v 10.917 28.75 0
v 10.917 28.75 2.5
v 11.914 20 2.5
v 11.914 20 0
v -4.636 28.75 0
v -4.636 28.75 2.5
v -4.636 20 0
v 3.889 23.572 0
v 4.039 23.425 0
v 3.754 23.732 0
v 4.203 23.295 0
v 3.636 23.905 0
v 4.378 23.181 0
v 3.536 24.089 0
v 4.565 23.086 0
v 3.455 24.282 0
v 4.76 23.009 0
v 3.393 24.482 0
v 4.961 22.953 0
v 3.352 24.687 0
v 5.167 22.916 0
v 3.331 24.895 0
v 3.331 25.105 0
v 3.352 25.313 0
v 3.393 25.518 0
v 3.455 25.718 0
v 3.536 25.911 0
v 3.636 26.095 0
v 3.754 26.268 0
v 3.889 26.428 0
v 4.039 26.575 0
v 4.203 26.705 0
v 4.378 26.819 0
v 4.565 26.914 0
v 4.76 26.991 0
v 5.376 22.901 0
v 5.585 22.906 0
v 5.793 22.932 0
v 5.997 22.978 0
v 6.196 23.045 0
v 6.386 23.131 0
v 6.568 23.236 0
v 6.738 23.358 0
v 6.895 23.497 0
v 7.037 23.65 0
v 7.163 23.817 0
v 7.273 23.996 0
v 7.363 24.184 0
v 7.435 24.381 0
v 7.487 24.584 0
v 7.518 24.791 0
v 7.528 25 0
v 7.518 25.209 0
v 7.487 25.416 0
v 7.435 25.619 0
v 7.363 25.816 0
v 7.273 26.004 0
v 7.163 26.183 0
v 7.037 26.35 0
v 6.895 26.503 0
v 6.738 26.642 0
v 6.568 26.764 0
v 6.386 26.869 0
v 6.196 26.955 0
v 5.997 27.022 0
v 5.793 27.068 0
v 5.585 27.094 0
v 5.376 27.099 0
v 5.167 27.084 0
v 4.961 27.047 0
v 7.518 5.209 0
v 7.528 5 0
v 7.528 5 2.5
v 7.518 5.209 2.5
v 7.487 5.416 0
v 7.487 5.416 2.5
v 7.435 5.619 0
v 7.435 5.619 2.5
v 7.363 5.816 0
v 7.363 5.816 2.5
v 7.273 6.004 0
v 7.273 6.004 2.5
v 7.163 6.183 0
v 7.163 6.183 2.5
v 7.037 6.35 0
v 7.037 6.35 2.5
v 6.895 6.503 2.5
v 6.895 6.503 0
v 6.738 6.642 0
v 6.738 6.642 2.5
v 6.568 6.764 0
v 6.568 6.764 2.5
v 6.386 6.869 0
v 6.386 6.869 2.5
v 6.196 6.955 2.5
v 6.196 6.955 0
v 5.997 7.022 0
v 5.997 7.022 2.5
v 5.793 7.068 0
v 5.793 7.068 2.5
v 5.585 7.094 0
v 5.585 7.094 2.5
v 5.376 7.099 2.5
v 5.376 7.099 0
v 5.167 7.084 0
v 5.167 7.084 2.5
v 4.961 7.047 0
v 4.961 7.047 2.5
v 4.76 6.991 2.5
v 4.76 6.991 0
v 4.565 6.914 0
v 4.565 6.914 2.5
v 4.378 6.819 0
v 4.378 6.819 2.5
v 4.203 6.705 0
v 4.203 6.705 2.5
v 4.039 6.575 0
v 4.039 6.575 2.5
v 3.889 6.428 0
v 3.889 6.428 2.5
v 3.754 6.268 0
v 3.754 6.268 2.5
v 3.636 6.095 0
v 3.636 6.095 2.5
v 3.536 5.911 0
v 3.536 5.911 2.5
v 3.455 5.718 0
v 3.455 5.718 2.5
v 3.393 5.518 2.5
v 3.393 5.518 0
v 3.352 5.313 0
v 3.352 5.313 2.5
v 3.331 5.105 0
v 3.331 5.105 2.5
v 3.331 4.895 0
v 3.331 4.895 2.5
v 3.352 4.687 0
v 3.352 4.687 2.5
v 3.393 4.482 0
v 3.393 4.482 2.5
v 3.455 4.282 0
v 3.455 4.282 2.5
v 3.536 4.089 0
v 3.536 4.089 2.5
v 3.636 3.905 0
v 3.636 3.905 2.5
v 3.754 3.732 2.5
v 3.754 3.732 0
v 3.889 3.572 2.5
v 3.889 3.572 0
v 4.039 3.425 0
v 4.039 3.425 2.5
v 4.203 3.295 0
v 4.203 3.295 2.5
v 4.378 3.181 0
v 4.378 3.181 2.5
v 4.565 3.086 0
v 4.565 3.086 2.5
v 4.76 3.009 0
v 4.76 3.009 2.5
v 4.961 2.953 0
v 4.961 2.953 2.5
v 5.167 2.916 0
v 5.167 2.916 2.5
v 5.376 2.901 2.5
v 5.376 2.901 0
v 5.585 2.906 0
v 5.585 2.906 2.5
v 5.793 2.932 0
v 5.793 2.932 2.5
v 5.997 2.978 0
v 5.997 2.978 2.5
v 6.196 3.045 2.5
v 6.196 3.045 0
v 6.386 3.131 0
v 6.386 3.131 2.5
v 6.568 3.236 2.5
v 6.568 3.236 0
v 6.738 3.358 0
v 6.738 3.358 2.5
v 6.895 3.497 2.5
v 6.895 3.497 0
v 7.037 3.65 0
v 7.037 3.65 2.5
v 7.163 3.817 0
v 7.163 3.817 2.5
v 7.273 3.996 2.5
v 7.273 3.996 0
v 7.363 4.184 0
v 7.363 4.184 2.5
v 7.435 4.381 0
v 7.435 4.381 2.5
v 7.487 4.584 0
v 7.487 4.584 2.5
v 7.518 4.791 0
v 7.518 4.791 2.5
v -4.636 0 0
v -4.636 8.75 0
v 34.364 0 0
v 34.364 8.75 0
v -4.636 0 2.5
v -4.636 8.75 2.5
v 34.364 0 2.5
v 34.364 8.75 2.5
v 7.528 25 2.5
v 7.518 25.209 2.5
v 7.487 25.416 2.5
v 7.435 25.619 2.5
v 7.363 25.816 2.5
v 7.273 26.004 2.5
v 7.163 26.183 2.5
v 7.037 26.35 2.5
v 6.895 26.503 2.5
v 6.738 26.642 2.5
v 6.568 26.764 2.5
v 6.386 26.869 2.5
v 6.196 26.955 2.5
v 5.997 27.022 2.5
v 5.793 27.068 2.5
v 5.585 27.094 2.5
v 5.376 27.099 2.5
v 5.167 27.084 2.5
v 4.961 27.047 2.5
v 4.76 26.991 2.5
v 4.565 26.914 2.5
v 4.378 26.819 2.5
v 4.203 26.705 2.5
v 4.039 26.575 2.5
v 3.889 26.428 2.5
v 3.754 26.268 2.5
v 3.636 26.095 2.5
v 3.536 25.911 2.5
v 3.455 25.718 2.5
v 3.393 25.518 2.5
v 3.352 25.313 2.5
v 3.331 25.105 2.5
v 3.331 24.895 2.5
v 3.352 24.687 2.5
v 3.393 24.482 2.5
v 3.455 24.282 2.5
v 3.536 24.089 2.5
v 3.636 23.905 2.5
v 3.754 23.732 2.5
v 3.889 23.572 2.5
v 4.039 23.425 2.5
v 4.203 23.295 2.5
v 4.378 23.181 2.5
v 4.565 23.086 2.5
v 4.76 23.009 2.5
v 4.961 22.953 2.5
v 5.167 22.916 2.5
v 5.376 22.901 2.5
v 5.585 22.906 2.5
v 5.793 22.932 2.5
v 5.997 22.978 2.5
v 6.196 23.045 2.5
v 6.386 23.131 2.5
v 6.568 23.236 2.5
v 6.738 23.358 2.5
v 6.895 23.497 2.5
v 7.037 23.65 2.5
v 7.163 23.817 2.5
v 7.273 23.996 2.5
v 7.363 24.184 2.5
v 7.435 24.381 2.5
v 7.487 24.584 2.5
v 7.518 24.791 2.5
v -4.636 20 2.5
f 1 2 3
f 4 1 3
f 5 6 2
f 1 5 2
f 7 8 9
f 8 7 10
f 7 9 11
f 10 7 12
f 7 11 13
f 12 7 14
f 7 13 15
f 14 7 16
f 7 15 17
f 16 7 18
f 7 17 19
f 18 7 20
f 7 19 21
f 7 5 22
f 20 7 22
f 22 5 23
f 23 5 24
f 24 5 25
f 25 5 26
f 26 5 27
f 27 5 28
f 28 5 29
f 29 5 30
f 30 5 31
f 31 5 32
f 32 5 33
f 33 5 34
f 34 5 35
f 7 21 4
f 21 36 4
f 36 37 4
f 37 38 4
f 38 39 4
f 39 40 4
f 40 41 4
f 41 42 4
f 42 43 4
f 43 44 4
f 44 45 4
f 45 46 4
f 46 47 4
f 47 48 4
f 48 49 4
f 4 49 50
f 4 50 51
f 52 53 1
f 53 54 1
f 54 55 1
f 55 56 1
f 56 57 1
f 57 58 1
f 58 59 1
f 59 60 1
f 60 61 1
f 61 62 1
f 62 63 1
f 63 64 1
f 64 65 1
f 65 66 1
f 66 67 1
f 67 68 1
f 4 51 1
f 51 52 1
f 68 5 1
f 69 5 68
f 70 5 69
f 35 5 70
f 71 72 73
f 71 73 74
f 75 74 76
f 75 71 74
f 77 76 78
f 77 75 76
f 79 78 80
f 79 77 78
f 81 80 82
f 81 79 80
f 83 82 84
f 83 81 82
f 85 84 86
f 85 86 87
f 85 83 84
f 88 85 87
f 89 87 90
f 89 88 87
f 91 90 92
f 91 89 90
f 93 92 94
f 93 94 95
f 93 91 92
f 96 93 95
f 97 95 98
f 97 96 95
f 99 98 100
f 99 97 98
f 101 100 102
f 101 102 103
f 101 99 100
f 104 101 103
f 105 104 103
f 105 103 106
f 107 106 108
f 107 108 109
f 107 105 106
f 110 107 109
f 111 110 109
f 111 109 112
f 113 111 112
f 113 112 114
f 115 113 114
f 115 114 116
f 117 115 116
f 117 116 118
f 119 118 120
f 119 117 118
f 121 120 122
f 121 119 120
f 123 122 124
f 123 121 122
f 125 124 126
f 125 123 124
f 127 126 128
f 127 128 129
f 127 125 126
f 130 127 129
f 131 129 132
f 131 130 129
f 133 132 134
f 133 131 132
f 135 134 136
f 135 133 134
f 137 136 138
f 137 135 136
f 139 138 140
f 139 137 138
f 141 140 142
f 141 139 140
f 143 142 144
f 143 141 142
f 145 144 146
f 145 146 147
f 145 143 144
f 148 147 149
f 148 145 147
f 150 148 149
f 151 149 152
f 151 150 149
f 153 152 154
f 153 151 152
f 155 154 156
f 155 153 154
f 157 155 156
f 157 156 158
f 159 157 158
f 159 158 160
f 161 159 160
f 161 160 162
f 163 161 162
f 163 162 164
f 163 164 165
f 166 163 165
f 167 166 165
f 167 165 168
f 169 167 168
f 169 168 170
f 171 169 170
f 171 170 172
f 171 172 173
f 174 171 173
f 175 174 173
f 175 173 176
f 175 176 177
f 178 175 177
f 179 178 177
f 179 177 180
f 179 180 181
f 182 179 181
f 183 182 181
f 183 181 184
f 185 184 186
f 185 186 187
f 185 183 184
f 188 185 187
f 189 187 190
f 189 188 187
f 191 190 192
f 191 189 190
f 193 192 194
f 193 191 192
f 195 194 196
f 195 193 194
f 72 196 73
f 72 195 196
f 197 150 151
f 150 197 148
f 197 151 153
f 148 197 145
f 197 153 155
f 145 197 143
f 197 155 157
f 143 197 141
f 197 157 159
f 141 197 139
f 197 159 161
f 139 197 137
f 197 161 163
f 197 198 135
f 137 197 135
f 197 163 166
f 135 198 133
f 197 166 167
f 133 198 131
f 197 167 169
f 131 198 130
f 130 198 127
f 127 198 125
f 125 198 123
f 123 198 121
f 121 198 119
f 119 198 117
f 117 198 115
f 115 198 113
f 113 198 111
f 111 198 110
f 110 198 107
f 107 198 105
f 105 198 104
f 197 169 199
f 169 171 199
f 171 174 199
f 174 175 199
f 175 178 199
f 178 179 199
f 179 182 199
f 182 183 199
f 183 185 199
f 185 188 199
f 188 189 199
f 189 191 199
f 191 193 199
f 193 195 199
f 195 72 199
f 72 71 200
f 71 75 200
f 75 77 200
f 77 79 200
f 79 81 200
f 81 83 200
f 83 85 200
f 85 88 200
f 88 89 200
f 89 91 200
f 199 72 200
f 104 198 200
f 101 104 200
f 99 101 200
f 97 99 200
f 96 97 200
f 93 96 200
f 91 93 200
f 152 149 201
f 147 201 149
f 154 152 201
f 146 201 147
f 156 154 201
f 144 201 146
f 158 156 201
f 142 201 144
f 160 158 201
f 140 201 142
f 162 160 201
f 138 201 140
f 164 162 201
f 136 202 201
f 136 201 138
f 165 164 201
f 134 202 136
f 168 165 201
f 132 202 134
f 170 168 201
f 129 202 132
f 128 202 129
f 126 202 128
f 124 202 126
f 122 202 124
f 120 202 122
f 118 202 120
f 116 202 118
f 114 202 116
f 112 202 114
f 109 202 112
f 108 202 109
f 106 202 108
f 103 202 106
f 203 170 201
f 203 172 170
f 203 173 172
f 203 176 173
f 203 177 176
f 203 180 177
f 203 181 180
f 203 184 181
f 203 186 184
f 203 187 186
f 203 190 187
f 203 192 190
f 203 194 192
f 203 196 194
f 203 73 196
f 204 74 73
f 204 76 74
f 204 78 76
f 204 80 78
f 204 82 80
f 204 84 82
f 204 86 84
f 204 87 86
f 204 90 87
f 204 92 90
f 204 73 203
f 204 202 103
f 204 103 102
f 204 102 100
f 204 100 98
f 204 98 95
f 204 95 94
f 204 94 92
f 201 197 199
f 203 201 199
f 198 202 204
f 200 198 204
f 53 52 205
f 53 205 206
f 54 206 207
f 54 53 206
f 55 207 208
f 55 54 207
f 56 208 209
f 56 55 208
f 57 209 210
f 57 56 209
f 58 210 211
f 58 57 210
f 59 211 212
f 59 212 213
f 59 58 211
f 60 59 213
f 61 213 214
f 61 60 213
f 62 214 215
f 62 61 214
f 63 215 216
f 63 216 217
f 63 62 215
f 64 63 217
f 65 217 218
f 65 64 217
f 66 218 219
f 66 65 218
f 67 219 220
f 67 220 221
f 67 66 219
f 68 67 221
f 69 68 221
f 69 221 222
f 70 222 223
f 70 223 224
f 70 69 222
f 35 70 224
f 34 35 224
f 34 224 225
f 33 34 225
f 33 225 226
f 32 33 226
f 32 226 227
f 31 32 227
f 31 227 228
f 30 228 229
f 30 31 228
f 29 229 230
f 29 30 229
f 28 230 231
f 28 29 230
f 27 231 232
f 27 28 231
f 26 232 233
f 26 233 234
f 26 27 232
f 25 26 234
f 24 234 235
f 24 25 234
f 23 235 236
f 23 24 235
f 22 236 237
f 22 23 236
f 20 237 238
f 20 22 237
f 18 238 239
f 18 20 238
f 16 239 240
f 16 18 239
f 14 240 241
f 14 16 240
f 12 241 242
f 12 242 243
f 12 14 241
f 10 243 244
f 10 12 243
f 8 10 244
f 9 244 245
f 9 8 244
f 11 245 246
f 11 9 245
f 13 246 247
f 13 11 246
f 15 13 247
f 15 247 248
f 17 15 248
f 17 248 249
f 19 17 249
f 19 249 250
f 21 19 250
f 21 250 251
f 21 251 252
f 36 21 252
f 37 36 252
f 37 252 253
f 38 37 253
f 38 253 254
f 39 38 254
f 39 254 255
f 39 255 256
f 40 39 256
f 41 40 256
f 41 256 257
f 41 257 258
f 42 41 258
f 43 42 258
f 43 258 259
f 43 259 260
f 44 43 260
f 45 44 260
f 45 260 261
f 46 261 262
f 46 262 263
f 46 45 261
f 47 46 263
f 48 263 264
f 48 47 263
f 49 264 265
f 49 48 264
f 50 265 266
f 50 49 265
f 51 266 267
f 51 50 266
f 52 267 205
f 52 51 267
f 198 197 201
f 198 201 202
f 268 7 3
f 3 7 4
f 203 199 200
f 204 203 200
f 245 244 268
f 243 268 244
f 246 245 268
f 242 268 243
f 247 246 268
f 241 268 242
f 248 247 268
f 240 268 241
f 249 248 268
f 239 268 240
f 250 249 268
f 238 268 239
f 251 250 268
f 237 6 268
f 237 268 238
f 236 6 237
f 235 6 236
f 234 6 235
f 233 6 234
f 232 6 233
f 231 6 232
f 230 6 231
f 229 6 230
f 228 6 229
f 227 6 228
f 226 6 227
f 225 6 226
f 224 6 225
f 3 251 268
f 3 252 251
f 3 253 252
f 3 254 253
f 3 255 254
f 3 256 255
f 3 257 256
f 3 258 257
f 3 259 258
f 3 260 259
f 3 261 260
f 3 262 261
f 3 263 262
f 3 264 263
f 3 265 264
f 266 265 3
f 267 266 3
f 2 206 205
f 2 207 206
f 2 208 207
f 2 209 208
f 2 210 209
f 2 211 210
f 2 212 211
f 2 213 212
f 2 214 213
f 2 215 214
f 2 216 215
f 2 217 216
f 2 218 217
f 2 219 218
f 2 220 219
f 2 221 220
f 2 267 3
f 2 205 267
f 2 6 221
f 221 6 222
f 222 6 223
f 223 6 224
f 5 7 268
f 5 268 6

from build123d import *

# Parameters (mm, degrees)
F0_W     = 19
F0_H     = 10
F0_R     = 2.1
F0_W_2   = 20
F1_DEPTH = 2.5
F2_W     = 39
F2_H     = 1.25
F3_DEPTH = 2.501
F6_DEPTH = 2.501


with BuildPart() as f1:
    # F0 (on Top) → F1 (new body)
    with BuildSketch(Plane.XY):
        with Locations((4.863633034, 5)):
            Rectangle(F0_W, F0_H)
        with Locations((5.428398028, 5)):
            Circle(F0_R, mode=Mode.SUBTRACT)
        with Locations((24.363633034, 5)):
            Rectangle(F0_W_2, F0_H)
    extrude(amount=F1_DEPTH)

    # F2 (on face) → F3 (cut, through all)
    with BuildSketch(Plane.XY.offset(2.5)):
        with Locations((14.863633034, 9.375)):
            Rectangle(F2_W, F2_H)
    extrude(amount=-F3_DEPTH, mode=Mode.SUBTRACT)


with BuildPart() as f4_1:
    # F4: copy of F1
    add(f1.part.moved(Location((0, 20, 0))))

    # F5 (on face) → F6 (cut, through all)
    with BuildSketch(Plane.XY.offset(2.5)):
        Polygon((10.9172677621, 28.75), (11.914011091, 20), (34.363633034, 20), (34.363633034, 28.75), align=None)
    extrude(amount=-F6_DEPTH, mode=Mode.SUBTRACT)


solid = Compound([f1.part, f4_1.part])
